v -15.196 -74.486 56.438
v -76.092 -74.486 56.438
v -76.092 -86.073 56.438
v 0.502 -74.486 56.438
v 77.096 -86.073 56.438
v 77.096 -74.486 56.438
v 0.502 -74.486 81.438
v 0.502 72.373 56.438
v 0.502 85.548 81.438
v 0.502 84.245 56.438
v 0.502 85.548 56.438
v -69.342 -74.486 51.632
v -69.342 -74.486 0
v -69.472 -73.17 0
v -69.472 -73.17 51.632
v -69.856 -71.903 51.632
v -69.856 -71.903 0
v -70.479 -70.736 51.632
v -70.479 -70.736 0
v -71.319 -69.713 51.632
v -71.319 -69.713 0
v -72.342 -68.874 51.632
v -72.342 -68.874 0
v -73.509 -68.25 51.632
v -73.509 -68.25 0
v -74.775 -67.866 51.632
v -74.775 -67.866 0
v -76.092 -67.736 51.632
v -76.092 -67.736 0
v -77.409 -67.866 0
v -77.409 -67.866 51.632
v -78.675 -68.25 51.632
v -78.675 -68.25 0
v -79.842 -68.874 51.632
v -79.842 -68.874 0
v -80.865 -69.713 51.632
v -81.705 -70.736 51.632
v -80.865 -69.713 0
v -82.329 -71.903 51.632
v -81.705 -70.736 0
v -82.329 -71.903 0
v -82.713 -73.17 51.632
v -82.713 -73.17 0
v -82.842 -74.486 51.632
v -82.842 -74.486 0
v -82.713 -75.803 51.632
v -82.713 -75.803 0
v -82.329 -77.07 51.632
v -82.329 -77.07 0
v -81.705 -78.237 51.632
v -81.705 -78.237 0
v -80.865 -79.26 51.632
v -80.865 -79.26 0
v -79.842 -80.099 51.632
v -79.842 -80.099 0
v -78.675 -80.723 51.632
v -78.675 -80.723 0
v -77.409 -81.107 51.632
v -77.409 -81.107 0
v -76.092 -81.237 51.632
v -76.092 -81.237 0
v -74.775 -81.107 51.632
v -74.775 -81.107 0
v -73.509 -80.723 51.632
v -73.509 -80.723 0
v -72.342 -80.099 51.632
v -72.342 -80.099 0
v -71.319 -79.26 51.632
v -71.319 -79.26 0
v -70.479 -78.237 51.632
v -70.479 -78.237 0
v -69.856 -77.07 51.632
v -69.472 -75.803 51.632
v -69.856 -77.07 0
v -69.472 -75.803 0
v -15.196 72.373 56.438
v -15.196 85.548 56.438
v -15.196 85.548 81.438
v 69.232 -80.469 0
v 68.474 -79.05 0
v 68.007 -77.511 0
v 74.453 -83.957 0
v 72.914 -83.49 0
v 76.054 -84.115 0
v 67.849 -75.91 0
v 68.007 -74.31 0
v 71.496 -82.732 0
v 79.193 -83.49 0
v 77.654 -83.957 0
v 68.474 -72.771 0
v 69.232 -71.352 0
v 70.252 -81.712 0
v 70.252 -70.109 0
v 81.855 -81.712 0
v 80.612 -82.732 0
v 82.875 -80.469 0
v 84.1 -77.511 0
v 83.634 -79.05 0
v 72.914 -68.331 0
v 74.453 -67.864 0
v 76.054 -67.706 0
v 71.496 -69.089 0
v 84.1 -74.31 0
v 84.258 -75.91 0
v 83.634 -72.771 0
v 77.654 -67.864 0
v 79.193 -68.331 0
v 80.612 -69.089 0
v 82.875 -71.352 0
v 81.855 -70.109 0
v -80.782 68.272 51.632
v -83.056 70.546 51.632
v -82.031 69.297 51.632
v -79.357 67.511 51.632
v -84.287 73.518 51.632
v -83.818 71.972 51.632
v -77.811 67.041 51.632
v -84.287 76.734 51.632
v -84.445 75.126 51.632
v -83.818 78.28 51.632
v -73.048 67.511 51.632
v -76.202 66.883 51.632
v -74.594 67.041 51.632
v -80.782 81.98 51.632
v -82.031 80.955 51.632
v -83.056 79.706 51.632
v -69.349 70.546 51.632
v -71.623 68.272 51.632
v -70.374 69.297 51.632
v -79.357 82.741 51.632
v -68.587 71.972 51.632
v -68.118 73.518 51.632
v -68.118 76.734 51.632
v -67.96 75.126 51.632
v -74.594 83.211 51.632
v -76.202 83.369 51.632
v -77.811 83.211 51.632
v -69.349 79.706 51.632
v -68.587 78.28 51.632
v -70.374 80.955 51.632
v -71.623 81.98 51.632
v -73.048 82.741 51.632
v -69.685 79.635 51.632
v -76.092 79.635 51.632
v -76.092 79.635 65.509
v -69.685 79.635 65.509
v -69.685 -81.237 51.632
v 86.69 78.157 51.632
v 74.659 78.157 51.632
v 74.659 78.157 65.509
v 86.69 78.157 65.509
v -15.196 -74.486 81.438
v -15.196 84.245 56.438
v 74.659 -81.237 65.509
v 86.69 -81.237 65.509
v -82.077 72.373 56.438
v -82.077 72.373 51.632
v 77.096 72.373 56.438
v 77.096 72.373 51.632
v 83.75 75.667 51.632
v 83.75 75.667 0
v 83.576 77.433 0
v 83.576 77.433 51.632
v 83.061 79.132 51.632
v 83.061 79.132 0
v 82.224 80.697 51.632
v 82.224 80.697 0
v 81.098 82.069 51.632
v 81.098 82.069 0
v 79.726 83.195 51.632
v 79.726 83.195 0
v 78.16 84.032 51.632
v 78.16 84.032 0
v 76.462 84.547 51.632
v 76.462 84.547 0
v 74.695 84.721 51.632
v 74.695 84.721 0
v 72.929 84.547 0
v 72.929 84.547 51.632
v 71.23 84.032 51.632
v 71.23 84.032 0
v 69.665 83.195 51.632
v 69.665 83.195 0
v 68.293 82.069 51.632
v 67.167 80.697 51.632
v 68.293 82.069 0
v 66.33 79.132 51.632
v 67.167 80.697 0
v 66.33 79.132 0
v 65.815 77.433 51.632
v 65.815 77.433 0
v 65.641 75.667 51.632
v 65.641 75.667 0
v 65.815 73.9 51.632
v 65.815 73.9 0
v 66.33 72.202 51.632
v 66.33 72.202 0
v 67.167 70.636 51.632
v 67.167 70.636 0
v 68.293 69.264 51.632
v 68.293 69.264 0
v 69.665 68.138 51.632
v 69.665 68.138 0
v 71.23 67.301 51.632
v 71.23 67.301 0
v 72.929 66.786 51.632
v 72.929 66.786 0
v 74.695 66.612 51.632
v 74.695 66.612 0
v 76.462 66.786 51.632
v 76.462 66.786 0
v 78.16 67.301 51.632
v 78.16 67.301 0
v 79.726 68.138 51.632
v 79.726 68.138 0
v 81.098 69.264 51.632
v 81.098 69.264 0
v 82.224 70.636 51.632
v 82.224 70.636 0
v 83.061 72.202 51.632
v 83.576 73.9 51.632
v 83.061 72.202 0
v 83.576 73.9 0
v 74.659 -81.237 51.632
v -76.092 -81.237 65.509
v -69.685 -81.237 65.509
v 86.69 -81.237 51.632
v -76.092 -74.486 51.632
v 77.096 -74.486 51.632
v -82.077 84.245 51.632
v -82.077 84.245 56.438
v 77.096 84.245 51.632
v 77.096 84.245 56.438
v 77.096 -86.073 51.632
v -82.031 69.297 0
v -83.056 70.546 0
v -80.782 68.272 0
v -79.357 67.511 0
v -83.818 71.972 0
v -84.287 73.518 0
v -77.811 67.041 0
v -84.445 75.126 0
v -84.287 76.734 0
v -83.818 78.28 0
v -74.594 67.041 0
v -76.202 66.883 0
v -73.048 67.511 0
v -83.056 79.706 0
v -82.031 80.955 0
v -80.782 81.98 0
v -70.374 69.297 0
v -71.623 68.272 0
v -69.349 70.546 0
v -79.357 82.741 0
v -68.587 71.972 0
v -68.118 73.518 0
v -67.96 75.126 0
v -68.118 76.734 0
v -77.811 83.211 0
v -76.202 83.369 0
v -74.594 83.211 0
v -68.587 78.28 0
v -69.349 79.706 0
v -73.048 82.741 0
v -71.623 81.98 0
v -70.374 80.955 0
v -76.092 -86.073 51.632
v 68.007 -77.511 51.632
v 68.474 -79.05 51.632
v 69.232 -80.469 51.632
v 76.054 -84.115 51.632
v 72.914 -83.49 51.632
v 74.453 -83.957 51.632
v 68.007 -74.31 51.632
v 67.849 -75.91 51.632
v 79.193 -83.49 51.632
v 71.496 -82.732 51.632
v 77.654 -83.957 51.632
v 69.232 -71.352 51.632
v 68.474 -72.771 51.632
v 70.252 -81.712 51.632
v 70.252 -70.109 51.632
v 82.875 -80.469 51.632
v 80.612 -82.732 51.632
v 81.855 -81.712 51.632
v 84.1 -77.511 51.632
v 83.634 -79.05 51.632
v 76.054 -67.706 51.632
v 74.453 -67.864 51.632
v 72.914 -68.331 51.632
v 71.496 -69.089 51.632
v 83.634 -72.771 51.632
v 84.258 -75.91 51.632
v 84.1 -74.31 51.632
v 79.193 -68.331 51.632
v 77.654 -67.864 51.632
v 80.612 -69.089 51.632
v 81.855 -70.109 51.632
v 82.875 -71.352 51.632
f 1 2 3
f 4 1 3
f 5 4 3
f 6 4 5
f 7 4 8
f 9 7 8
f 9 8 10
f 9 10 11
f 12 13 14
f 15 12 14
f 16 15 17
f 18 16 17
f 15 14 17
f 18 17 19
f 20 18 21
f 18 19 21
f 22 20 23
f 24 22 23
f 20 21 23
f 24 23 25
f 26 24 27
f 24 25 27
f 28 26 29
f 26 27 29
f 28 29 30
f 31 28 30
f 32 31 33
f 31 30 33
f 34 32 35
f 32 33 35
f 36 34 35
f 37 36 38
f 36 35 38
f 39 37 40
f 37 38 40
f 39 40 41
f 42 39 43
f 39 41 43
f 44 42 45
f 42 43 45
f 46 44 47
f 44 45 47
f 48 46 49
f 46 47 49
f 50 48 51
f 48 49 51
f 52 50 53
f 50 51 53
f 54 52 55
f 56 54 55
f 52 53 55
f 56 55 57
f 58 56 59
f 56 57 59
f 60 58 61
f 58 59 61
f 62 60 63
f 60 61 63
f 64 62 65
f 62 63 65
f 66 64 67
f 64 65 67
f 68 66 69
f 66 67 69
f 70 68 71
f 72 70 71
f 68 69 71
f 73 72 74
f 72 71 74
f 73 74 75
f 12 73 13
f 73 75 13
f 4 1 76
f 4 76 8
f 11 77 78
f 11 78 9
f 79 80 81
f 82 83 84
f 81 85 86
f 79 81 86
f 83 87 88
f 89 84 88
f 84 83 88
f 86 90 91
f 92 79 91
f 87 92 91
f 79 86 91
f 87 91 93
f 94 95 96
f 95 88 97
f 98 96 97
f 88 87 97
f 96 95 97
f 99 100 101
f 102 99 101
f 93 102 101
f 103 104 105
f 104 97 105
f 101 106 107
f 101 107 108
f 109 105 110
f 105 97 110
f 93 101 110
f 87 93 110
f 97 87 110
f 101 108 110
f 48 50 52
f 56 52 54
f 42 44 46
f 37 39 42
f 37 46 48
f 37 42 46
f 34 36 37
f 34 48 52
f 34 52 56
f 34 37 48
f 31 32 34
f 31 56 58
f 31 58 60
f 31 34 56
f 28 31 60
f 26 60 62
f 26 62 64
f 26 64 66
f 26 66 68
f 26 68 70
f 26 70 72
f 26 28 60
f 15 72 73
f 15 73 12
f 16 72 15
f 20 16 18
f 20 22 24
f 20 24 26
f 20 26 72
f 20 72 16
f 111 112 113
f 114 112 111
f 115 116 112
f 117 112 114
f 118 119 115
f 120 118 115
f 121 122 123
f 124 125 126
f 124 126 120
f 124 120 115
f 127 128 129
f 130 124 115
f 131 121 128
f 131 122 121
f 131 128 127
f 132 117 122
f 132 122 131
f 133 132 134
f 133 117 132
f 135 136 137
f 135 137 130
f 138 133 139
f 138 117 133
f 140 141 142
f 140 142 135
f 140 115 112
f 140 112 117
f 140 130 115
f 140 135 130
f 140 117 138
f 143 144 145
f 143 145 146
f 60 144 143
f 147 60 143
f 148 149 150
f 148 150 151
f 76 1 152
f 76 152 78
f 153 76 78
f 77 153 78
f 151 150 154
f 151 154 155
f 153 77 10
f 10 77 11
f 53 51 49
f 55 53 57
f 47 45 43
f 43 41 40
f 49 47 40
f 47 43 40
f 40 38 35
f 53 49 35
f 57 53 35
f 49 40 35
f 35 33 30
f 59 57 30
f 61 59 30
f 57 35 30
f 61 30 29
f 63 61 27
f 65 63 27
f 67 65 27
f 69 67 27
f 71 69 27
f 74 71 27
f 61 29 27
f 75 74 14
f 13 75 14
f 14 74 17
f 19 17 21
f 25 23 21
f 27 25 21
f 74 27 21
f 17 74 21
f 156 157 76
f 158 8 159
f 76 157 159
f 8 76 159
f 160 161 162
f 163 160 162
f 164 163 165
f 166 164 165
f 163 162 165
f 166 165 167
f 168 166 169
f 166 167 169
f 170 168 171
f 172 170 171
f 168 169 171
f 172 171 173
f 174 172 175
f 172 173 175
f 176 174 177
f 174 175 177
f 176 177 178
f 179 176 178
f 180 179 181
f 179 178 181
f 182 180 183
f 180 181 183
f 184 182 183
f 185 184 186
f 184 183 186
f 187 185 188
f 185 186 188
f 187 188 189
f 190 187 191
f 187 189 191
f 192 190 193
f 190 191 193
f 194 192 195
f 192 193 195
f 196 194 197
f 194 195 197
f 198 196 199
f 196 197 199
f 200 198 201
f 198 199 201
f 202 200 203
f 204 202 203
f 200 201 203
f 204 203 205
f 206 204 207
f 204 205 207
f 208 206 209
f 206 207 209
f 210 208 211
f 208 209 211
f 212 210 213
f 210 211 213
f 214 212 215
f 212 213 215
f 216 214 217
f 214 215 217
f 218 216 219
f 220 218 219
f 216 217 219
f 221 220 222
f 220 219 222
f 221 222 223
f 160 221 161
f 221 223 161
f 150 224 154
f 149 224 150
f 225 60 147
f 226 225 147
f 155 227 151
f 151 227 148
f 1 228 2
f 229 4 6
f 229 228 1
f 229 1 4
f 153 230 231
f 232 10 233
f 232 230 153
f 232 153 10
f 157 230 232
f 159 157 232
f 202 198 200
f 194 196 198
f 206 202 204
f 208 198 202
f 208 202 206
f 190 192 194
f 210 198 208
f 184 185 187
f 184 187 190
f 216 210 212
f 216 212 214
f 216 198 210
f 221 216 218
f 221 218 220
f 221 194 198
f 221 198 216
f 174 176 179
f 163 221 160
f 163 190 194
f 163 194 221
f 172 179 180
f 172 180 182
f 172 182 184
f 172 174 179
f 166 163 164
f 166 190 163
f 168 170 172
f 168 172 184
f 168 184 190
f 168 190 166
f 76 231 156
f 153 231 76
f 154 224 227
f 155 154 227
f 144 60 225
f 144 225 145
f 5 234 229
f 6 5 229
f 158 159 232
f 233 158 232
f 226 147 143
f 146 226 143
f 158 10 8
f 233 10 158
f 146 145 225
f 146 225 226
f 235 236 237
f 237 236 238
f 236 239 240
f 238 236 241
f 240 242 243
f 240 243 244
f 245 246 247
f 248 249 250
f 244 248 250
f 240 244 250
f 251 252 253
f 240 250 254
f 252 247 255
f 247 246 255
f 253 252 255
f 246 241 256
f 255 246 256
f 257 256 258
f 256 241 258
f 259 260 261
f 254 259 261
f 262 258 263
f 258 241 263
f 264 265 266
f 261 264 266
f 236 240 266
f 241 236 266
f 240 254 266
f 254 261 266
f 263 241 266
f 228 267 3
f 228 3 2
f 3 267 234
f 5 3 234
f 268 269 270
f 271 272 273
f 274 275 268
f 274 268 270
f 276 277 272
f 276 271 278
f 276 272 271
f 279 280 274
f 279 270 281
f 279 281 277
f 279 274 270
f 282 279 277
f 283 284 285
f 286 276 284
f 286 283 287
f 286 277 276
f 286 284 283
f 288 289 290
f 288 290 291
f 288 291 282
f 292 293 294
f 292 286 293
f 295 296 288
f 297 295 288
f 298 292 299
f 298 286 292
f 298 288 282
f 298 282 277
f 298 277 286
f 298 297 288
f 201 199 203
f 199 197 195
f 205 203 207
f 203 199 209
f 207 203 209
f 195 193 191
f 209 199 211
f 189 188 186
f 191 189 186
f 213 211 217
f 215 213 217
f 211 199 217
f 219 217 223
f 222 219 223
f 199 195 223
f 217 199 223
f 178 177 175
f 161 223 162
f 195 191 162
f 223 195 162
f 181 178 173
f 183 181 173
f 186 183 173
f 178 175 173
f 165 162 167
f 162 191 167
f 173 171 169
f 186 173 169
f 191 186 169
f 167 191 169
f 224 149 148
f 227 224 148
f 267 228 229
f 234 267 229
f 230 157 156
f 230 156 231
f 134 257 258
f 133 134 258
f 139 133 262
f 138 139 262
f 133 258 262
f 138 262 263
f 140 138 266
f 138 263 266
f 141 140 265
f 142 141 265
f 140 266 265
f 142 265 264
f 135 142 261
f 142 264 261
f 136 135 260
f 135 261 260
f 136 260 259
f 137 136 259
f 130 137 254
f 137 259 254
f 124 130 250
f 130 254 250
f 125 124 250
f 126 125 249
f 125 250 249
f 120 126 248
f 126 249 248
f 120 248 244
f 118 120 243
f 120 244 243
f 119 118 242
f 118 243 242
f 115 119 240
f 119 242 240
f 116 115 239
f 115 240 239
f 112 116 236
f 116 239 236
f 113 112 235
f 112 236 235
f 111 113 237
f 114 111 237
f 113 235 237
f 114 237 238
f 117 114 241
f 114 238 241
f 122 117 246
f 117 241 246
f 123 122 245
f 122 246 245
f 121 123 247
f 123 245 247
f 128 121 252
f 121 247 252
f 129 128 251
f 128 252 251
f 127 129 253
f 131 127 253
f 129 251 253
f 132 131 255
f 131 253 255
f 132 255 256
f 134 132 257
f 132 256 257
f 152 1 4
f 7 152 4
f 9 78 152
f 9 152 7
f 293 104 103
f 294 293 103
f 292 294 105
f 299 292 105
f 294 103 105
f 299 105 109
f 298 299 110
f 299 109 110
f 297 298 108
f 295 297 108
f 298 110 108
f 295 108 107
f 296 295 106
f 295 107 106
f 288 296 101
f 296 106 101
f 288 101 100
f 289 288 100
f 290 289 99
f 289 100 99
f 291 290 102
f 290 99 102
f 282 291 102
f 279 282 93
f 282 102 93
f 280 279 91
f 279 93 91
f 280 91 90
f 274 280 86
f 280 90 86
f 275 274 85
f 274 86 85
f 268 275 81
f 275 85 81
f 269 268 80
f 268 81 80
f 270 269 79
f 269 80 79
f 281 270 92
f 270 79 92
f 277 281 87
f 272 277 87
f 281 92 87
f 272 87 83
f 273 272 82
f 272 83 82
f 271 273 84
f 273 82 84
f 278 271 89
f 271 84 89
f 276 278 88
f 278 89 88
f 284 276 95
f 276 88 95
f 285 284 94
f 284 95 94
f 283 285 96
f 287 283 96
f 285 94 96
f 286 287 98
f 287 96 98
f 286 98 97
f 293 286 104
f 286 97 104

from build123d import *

# Parameters (mm, degrees)
F0_R     = 6.7502519556
F1_DEPTH = 51.6322273761
F0_R_2   = 8.2428902102
F0_R_3   = 8.2043816193
F0_R_4   = 9.0544508345
F2_W     = 153.1884595752
F2_H     = 11.5868598223
F3_DEPTH = 4.8059914261
F2_W_2   = 159.1729074717
F2_H_2   = 11.8715316057
F4_W     = 6.4072363684
F4_H     = 160.8719712535
F5_DEPTH = 13.8763096184
F4_W_2   = 12.0313093066
F4_H_2   = 159.393261973
F6_W     = 15.6986350194
F6_H     = 160.0341200829
F7_DEPTH = 25


with BuildPart() as f1:
    # F0 (on Top) → F1 (new body)
    with BuildSketch(Plane.XY):
        with Locations((-76.0920867324, -74.4864344597)):
            Circle(F0_R)
    extrude(amount=F1_DEPTH)


with BuildPart() as f1b:
    # F0 (on Top) → F1, piece 2 (new body)
    with BuildSketch(Plane.XY):
        with Locations((-76.2024596334, 75.1259997487)):
            Circle(F0_R_2)
    extrude(amount=F1_DEPTH)


with BuildPart() as f1c:
    # F0 (on Top) → F1, piece 3 (new body)
    with BuildSketch(Plane.XY):
        with Locations((76.0536789894, -75.9104341269)):
            Circle(F0_R_3)
    extrude(amount=F1_DEPTH)


with BuildPart() as f1d:
    # F0 (on Top) → F1, piece 4 (new body)
    with BuildSketch(Plane.XY):
        with Locations((74.6953114867, 75.6666362286)):
            Circle(F0_R_4)
    extrude(amount=F1_DEPTH)


with BuildPart() as f3:
    # F2 (on face) → F3 (new body)
    with BuildSketch(Plane.XY.offset(51.6322273761)):
        with Locations((0.5021430552, -80.2798643708)):
            Rectangle(F2_W, F2_H)
    extrude(amount=F3_DEPTH)



with BuildPart() as f3b:
    # F2 (on face) → F3, piece 2 (new body)
    with BuildSketch(Plane.XY.offset(51.6322273761)):
        with Locations((-2.490080893, 78.3090814948)):
            Rectangle(F2_W_2, F2_H_2)
    extrude(amount=F3_DEPTH)


with BuildPart() as f5:
    # F4 (on face) → F5 (new body)
    with BuildSketch(Plane.XY.offset(51.6322273761)):
        with Locations((-72.8882726585, -0.8007007857)):
            Rectangle(F4_W, F4_H)
    extrude(amount=F5_DEPTH)


with BuildPart() as f5b:
    # F4 (on face) → F5, piece 2 (new body)
    with BuildSketch(Plane.XY.offset(51.6322273761)):
        with Locations((80.6747414172, -1.5400554259)):
            Rectangle(F4_W_2, F4_H_2)
    extrude(amount=F5_DEPTH)


with BuildPart() as f3_1:
    add(f3.part)

    add(f3b.part)  # F7 merges F3b
    # F6 (on face) → F7 (join)
    with BuildSketch(Plane.XY.offset(56.4382188022)):
        with Locations((-7.3471744545, 5.5306255817)):
            Rectangle(F6_W, F6_H)
    extrude(amount=F7_DEPTH)


solid = Compound([f1.part, f1b.part, f1c.part, f1d.part, f5.part, f5b.part, f3_1.part])
